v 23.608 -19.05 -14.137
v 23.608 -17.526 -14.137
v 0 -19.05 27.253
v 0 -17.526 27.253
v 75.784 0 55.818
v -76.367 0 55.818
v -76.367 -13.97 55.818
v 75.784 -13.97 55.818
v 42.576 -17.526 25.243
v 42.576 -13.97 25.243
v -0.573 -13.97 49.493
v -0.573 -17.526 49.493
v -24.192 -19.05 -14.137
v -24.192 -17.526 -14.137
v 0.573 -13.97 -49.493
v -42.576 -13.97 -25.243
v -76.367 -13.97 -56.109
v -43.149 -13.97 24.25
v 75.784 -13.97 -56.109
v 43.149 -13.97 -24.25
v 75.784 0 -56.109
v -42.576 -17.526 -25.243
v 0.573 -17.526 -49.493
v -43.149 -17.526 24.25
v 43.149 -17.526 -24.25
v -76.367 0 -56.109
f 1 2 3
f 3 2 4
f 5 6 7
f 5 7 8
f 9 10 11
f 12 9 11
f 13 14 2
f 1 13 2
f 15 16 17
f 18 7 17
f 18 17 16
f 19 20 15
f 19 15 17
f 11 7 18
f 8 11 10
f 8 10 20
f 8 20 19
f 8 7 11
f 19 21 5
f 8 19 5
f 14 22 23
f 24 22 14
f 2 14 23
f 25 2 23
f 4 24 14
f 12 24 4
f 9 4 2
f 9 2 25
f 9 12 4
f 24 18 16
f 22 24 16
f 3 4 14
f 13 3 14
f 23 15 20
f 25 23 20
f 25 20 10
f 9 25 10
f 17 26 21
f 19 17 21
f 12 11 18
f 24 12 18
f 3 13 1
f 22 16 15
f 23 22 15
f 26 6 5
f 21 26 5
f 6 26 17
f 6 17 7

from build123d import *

# Parameters (mm, degrees)
F0_W     = 152.150162
F0_H     = 111.926563
F1_DEPTH = 13.97
F3_DEPTH = 3.556
F5_DEPTH = 1.524


with BuildPart() as f1:
    # F0 (on Front) → F1 (new body)
    with BuildSketch(Plane.XZ):
        with Locations((-0.291478, -0.145737)):
            Rectangle(F0_W, F0_H)
    extrude(amount=F1_DEPTH)

    # F2 (on face) → F3 (join)
    with BuildSketch(Plane.XZ.offset(13.97)):
        Polygon((-0.572803, 49.492897), (-43.148508, 24.250387), (-42.575705, -25.242511), (0.572803, -49.492897), (43.148508, -24.250387), (42.575705, 25.242511), align=None)
    extrude(amount=F3_DEPTH)

    # F4 (on face) → F5 (join)
    with BuildSketch(Plane.XZ.offset(17.526)):
        Polygon((23.607507, -14.136557), (0, 27.25295), (-24.19246, -14.136557), align=None)
    extrude(amount=F5_DEPTH)


solid = f1.part
